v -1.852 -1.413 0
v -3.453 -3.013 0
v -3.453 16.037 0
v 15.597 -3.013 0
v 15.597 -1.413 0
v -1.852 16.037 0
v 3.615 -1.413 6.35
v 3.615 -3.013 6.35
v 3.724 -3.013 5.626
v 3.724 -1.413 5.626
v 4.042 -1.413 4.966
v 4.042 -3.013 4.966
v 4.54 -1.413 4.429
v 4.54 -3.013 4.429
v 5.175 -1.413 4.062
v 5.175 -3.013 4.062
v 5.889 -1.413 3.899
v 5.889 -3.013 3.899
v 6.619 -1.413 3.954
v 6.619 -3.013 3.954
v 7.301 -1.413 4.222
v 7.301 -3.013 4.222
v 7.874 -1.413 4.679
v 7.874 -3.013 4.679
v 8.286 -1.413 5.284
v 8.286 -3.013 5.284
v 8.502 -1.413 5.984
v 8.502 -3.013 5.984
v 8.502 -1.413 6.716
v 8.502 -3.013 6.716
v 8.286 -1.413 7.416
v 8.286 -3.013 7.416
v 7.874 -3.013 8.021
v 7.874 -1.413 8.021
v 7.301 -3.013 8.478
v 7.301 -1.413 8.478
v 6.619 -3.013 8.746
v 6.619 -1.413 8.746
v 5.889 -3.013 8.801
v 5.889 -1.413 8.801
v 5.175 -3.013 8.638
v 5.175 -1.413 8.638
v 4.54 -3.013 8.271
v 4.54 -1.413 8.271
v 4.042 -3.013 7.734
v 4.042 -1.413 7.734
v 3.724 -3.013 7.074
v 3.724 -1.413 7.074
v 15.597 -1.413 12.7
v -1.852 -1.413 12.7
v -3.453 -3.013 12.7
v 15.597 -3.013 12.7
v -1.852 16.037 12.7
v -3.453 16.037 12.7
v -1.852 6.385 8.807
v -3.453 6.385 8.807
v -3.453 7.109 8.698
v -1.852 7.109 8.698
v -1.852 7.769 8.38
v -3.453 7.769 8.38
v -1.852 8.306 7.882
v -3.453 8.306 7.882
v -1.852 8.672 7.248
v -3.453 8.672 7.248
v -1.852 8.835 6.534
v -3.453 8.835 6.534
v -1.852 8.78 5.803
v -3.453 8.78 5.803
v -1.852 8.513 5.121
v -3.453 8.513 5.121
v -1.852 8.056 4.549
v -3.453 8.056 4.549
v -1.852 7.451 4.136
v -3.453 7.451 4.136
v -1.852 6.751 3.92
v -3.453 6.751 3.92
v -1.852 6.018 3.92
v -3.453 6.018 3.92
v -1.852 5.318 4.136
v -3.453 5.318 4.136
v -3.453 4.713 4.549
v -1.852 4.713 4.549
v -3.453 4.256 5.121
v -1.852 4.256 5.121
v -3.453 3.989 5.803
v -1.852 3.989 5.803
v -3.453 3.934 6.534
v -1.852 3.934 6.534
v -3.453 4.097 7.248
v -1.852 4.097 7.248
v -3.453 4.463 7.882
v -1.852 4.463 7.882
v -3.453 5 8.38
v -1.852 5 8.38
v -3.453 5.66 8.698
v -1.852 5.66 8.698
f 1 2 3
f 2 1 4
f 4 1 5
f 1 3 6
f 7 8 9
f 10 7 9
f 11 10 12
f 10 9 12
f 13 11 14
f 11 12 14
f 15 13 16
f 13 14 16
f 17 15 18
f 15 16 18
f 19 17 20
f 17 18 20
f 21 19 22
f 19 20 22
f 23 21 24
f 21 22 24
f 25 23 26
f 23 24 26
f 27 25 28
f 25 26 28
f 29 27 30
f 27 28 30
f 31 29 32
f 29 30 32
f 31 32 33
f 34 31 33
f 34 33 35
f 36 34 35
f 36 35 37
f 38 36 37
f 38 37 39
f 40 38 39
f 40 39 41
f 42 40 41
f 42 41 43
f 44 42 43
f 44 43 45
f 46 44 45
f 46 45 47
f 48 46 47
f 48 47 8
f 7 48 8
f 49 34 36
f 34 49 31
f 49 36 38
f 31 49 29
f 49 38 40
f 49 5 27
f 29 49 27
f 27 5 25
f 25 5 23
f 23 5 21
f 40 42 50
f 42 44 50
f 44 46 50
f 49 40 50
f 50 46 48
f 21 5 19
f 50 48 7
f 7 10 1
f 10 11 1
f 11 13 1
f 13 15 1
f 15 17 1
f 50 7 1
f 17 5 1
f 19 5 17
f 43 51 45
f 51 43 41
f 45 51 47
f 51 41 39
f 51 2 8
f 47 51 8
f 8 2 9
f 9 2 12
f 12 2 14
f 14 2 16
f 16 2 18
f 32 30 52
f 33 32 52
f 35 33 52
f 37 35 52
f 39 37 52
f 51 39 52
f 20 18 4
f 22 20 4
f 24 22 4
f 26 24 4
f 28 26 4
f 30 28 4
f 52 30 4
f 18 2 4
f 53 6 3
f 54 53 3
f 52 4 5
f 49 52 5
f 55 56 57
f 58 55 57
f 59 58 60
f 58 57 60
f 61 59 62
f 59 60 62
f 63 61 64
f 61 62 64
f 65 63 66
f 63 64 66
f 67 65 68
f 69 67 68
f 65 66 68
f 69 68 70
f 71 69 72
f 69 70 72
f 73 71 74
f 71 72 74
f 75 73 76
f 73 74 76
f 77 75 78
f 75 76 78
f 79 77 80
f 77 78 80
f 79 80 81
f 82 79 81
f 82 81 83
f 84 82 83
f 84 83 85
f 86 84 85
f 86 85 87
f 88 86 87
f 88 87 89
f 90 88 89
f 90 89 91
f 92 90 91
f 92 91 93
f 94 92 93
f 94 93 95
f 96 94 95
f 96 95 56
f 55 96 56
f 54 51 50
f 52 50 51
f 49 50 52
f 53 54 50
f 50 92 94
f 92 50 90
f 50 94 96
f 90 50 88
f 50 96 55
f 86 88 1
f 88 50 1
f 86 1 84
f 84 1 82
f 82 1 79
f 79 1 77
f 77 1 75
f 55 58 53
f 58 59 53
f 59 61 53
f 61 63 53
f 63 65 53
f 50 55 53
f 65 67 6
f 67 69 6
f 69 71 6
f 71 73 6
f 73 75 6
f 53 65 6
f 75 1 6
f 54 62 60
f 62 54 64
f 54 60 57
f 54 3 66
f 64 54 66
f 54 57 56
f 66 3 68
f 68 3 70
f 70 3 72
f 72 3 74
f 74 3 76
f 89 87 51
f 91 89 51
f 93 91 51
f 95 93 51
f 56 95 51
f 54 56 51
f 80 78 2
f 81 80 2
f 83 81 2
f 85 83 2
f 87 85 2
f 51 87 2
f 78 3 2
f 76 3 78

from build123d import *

# Parameters (mm, degrees)
BOSS_EXTRUDE1_DEPTH   = 12.7
F_8_CLEARANCE_HOLE1_D = 4.9149
F_8_CLEARANCE_HOLE2_D = 4.9149


with BuildPart() as part:
    # Sketch1 → Boss-Extrude1 (new body)
    with BuildSketch(Plane.XY):
        Polygon((-3.452609544, 16.036650639), (-3.452609544, -3.013349361), (15.597390456, -3.013349361), (15.597390456, -1.413149361), (-1.852409544, -1.413149361), (-1.852409544, 16.036650639), align=None)
    extrude(amount=BOSS_EXTRUDE1_DEPTH)

    # #8 Clearance Hole1 (through all)
    with Locations(Plane(origin=(0, -1.413149361, 0), x_dir=(1, 0, 0), z_dir=(0, 1, 0))):
        with Locations((6.072390456, -6.35)):
            Hole(F_8_CLEARANCE_HOLE1_D / 2)

    # #8 Clearance Hole2 (through all)
    with Locations(Plane(origin=(-1.852409544, 0, 0), x_dir=(0, 0, -1), z_dir=(1, 0, 0))):
        with Locations((-6.35, 6.384650639)):
            Hole(F_8_CLEARANCE_HOLE2_D / 2)


solid = part.part
